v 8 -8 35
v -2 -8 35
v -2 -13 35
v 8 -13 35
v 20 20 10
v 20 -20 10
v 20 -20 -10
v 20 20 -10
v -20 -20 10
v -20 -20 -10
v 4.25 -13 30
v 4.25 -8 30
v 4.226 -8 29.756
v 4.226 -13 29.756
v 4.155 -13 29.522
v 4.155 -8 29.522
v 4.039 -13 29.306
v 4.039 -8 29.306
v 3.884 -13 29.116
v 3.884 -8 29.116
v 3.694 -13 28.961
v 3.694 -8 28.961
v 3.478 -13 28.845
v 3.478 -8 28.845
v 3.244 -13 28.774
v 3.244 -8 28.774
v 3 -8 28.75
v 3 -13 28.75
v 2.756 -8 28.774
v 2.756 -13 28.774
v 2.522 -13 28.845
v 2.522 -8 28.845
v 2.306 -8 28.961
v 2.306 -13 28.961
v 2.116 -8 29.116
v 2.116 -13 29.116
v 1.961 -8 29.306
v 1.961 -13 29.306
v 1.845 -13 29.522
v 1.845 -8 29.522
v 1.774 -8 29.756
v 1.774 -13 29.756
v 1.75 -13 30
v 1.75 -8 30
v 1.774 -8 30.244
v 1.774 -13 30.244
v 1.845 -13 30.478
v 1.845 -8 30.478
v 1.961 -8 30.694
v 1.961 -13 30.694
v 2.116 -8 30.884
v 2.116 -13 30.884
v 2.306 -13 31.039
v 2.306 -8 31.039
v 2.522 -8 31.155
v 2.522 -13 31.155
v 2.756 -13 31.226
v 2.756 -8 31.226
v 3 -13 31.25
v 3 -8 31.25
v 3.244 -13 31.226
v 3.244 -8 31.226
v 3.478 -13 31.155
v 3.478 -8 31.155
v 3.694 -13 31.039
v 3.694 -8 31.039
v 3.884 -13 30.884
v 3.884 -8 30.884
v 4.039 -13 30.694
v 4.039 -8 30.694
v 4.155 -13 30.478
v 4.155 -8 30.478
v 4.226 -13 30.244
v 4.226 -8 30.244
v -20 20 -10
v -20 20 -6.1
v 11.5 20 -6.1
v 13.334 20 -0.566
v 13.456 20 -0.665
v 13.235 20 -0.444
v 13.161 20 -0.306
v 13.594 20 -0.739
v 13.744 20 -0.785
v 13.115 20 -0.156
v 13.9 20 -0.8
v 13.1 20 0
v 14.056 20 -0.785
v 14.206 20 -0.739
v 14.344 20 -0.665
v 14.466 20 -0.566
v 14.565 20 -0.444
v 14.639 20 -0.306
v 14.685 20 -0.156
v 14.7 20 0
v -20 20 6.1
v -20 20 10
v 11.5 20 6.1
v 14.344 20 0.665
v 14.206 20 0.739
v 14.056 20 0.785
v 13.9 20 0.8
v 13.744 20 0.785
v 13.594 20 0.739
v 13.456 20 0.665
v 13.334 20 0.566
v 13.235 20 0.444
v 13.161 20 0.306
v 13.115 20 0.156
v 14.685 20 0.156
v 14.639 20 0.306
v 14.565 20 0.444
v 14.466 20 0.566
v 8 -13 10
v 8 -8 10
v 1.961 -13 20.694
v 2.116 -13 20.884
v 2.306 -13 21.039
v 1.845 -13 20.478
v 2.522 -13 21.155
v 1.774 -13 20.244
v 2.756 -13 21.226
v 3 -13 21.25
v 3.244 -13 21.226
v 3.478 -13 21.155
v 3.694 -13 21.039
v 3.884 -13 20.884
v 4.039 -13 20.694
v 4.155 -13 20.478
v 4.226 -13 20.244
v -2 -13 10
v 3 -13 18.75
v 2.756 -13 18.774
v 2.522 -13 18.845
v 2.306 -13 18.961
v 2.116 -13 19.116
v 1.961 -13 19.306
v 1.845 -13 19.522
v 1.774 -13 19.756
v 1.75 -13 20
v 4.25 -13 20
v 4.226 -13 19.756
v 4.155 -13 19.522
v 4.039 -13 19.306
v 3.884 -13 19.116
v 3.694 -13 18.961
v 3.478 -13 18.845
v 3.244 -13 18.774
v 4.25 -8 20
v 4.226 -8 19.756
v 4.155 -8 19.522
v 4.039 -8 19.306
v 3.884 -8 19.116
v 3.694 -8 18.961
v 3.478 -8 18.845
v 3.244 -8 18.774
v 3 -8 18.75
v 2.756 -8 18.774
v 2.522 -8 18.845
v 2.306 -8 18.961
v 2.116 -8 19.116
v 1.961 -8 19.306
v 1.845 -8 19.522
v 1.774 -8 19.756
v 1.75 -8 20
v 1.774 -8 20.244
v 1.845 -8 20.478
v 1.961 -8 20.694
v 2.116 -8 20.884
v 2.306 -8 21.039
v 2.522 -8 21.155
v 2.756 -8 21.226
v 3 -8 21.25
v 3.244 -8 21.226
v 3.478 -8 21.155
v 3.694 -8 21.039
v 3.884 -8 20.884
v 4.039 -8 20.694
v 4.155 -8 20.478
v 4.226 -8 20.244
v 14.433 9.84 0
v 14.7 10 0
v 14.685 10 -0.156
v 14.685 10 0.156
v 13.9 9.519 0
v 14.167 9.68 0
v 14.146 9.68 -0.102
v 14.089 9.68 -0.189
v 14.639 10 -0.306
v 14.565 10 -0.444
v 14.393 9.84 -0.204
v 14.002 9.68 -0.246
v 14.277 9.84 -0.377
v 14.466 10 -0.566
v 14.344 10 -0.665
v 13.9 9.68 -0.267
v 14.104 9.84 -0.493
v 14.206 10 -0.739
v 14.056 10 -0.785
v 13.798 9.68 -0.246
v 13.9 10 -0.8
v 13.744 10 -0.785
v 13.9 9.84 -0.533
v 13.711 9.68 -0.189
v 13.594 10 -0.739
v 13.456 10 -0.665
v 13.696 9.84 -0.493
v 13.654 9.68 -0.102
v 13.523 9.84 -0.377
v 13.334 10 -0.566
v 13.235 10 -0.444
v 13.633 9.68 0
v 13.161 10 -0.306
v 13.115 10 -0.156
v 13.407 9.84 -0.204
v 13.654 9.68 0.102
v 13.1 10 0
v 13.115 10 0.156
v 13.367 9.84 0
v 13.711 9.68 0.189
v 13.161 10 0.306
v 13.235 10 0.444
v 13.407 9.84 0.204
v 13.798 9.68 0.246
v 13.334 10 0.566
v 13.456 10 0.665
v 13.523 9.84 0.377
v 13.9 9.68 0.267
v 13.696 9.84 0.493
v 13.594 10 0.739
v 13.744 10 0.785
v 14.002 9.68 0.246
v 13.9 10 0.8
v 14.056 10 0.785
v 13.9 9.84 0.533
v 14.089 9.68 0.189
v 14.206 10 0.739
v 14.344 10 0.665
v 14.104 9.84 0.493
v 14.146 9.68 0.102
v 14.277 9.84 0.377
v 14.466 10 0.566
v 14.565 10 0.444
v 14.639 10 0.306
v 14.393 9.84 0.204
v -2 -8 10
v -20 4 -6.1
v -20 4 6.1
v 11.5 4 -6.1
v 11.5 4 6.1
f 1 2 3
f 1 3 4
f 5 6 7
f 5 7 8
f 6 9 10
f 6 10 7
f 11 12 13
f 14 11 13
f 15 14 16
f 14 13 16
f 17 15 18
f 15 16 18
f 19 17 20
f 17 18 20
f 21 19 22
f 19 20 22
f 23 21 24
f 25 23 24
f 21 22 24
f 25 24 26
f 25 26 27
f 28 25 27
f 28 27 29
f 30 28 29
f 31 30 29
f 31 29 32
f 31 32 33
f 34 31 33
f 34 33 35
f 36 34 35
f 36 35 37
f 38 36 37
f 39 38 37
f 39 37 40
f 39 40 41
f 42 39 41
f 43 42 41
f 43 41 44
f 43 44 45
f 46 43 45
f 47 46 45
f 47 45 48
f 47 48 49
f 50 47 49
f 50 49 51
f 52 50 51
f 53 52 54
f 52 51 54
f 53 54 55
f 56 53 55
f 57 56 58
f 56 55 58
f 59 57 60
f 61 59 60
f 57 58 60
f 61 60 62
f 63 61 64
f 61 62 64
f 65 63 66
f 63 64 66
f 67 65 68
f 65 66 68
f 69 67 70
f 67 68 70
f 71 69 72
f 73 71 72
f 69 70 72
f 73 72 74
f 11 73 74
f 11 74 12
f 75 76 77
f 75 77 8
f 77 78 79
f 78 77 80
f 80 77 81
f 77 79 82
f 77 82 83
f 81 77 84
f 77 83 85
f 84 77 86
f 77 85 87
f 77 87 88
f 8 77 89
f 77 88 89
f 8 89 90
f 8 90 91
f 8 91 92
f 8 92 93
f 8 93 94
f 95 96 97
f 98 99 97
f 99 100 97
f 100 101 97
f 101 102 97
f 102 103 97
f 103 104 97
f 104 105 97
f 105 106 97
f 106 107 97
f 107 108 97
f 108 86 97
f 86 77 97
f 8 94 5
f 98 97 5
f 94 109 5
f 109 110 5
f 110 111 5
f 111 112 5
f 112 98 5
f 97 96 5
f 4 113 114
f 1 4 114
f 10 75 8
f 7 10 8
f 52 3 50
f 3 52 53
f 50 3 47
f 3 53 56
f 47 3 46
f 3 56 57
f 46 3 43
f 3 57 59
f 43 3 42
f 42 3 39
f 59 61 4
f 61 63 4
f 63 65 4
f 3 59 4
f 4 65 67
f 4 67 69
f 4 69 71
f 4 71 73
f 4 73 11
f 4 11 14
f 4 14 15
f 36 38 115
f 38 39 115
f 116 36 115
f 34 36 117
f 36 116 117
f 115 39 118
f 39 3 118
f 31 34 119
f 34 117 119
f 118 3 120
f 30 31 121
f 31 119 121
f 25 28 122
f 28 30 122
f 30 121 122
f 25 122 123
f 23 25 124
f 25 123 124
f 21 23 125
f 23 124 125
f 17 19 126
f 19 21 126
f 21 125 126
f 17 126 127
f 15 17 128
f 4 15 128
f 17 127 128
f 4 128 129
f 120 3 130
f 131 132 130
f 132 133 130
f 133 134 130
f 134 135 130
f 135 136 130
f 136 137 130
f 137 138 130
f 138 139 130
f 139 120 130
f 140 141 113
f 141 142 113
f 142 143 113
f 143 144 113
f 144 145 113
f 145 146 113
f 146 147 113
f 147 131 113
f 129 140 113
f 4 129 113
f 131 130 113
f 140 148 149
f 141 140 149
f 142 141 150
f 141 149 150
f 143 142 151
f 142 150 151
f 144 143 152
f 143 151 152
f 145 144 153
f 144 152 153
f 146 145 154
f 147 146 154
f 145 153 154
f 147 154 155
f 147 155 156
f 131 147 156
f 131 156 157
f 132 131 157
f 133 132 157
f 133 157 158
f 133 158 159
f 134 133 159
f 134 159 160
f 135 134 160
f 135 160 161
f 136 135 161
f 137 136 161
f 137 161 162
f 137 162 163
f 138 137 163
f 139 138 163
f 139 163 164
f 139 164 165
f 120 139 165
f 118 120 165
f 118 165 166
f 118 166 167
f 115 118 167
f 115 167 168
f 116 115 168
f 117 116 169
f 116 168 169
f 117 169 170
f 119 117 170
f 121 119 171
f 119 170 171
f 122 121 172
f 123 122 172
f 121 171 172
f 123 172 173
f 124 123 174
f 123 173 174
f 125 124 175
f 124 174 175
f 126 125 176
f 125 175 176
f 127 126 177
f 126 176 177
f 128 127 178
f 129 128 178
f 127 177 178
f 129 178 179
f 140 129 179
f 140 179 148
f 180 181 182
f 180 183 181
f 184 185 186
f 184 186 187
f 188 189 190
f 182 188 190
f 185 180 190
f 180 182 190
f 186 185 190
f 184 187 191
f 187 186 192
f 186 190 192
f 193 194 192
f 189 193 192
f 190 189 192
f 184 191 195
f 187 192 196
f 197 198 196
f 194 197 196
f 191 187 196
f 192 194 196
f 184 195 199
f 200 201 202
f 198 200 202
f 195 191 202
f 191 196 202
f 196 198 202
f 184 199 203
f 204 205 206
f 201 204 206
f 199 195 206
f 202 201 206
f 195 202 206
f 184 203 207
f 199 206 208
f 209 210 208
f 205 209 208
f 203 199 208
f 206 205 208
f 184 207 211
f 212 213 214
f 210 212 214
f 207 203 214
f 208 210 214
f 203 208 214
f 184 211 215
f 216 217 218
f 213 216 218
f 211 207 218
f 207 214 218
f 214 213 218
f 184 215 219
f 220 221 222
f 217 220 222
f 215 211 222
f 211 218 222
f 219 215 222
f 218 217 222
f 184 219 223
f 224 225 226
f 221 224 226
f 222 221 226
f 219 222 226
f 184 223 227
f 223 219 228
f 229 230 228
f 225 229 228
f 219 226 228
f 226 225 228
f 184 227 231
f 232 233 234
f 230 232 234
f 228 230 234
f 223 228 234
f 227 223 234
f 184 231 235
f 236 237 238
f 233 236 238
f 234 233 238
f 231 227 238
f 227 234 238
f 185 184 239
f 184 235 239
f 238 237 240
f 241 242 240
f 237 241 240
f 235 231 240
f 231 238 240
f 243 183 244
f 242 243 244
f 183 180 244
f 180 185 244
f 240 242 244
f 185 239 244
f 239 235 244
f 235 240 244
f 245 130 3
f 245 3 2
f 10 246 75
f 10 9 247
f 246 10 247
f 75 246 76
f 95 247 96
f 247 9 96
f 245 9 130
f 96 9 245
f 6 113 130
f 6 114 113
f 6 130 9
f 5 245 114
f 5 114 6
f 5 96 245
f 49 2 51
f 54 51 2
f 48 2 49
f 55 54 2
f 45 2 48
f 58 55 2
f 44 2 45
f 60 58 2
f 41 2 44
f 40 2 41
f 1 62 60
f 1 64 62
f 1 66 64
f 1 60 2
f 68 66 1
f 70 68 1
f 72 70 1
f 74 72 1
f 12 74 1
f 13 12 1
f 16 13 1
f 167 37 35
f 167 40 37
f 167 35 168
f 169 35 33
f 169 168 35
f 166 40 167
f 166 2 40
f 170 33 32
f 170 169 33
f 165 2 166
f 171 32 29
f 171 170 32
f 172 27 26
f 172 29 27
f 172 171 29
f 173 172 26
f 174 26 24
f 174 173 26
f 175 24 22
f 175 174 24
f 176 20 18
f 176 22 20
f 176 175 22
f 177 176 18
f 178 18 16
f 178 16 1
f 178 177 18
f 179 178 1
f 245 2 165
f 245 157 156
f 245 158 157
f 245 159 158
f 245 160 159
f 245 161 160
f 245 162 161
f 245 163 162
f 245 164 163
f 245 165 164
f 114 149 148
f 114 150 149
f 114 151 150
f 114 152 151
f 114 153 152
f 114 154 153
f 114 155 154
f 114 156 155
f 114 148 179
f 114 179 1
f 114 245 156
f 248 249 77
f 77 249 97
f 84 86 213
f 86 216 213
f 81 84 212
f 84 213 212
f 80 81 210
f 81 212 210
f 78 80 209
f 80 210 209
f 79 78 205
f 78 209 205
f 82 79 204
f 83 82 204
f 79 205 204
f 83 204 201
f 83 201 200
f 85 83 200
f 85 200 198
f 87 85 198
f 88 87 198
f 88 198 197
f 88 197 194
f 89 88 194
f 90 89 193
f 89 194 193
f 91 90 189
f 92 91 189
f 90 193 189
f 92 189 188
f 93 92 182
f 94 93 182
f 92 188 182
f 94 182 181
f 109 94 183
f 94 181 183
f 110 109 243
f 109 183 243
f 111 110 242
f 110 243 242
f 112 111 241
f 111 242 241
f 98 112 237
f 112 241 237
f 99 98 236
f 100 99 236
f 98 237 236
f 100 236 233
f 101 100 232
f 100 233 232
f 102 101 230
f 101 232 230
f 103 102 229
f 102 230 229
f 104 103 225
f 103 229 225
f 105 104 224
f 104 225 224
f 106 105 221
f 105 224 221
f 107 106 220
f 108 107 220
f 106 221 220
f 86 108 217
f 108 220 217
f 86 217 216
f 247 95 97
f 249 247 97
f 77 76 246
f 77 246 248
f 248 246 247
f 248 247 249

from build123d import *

# Parameters (mm, degrees)
SKETCH_2_W          = 40
SKETCH_2_H          = 40
EXTRUDE_1_DEPTH     = 10
SKETCH_3_W          = 50
SKETCH_3_H          = 16
CUT_EXTRUDE_1_DEPTH = 6.1
M2X0_4_1_D          = 1.6
M2X0_4_1_DEPTH      = 10
M2X0_4_1_TIP        = 0.480688495
SKETCH_13_W         = 10
SKETCH_13_H         = 5
EXTRUDE_5_DEPTH     = 25
M3X0_5_2_D          = 2.5
M3X0_5_2_DEPTH      = 8.5
M3X0_5_2_TIP        = 0.751075774


with BuildPart() as part:
    # ｽｹｯﾁ2 → ﾎﾞｽ - 押し出し1 (new body)
    with BuildSketch(Plane.XY):
        Rectangle(SKETCH_2_W, SKETCH_2_H)
    extrude_1 = extrude(amount=EXTRUDE_1_DEPTH)

    # ｽｹｯﾁ3 → ｶｯﾄ - 押し出し1 (cut)
    with BuildSketch(Plane.XY):
        with Locations((-13.5, 12)):
            Rectangle(SKETCH_3_W, SKETCH_3_H)
    cut_extrude_1 = extrude(amount=CUT_EXTRUDE_1_DEPTH, mode=Mode.SUBTRACT)

    # ﾐﾗｰ1: ﾎﾞｽ - 押し出し1, ｶｯﾄ - 押し出し1 across plane
    add(extrude_1.mirror(Plane.XY))
    add(cut_extrude_1.mirror(Plane.XY), mode=Mode.SUBTRACT)

    # M2x0.4 ねじ穴1
    with Locations(Plane(origin=(0, 20, 0), x_dir=(1, 0, 0), z_dir=(0, 1, 0))):
        with Locations((13.9, 0), (-13.9, 0)):
            Hole(M2X0_4_1_D / 2, depth=M2X0_4_1_DEPTH)
            with Locations((0, 0, -(M2X0_4_1_DEPTH + M2X0_4_1_TIP / 2))):  # 118° drill point
                Cone(0, M2X0_4_1_D / 2, M2X0_4_1_TIP, mode=Mode.SUBTRACT)

    # ｽｹｯﾁ13 → ﾎﾞｽ - 押し出し5 (add)
    with BuildSketch(Plane.XY.offset(10)):
        with Locations((3, -10.5)):
            Rectangle(SKETCH_13_W, SKETCH_13_H)
    extrude(amount=EXTRUDE_5_DEPTH)

    # M3x0.5 ねじ穴2
    with Locations(Plane(origin=(0, -13, 0), x_dir=(-1, 0, 0), z_dir=(0, -1, 0))):
        with Locations((-3, -20), (-3, -30)):
            Hole(M3X0_5_2_D / 2, depth=M3X0_5_2_DEPTH)
            with Locations((0, 0, -(M3X0_5_2_DEPTH + M3X0_5_2_TIP / 2))):  # 118° drill point
                Cone(0, M3X0_5_2_D / 2, M3X0_5_2_TIP, mode=Mode.SUBTRACT)


solid = part.part
